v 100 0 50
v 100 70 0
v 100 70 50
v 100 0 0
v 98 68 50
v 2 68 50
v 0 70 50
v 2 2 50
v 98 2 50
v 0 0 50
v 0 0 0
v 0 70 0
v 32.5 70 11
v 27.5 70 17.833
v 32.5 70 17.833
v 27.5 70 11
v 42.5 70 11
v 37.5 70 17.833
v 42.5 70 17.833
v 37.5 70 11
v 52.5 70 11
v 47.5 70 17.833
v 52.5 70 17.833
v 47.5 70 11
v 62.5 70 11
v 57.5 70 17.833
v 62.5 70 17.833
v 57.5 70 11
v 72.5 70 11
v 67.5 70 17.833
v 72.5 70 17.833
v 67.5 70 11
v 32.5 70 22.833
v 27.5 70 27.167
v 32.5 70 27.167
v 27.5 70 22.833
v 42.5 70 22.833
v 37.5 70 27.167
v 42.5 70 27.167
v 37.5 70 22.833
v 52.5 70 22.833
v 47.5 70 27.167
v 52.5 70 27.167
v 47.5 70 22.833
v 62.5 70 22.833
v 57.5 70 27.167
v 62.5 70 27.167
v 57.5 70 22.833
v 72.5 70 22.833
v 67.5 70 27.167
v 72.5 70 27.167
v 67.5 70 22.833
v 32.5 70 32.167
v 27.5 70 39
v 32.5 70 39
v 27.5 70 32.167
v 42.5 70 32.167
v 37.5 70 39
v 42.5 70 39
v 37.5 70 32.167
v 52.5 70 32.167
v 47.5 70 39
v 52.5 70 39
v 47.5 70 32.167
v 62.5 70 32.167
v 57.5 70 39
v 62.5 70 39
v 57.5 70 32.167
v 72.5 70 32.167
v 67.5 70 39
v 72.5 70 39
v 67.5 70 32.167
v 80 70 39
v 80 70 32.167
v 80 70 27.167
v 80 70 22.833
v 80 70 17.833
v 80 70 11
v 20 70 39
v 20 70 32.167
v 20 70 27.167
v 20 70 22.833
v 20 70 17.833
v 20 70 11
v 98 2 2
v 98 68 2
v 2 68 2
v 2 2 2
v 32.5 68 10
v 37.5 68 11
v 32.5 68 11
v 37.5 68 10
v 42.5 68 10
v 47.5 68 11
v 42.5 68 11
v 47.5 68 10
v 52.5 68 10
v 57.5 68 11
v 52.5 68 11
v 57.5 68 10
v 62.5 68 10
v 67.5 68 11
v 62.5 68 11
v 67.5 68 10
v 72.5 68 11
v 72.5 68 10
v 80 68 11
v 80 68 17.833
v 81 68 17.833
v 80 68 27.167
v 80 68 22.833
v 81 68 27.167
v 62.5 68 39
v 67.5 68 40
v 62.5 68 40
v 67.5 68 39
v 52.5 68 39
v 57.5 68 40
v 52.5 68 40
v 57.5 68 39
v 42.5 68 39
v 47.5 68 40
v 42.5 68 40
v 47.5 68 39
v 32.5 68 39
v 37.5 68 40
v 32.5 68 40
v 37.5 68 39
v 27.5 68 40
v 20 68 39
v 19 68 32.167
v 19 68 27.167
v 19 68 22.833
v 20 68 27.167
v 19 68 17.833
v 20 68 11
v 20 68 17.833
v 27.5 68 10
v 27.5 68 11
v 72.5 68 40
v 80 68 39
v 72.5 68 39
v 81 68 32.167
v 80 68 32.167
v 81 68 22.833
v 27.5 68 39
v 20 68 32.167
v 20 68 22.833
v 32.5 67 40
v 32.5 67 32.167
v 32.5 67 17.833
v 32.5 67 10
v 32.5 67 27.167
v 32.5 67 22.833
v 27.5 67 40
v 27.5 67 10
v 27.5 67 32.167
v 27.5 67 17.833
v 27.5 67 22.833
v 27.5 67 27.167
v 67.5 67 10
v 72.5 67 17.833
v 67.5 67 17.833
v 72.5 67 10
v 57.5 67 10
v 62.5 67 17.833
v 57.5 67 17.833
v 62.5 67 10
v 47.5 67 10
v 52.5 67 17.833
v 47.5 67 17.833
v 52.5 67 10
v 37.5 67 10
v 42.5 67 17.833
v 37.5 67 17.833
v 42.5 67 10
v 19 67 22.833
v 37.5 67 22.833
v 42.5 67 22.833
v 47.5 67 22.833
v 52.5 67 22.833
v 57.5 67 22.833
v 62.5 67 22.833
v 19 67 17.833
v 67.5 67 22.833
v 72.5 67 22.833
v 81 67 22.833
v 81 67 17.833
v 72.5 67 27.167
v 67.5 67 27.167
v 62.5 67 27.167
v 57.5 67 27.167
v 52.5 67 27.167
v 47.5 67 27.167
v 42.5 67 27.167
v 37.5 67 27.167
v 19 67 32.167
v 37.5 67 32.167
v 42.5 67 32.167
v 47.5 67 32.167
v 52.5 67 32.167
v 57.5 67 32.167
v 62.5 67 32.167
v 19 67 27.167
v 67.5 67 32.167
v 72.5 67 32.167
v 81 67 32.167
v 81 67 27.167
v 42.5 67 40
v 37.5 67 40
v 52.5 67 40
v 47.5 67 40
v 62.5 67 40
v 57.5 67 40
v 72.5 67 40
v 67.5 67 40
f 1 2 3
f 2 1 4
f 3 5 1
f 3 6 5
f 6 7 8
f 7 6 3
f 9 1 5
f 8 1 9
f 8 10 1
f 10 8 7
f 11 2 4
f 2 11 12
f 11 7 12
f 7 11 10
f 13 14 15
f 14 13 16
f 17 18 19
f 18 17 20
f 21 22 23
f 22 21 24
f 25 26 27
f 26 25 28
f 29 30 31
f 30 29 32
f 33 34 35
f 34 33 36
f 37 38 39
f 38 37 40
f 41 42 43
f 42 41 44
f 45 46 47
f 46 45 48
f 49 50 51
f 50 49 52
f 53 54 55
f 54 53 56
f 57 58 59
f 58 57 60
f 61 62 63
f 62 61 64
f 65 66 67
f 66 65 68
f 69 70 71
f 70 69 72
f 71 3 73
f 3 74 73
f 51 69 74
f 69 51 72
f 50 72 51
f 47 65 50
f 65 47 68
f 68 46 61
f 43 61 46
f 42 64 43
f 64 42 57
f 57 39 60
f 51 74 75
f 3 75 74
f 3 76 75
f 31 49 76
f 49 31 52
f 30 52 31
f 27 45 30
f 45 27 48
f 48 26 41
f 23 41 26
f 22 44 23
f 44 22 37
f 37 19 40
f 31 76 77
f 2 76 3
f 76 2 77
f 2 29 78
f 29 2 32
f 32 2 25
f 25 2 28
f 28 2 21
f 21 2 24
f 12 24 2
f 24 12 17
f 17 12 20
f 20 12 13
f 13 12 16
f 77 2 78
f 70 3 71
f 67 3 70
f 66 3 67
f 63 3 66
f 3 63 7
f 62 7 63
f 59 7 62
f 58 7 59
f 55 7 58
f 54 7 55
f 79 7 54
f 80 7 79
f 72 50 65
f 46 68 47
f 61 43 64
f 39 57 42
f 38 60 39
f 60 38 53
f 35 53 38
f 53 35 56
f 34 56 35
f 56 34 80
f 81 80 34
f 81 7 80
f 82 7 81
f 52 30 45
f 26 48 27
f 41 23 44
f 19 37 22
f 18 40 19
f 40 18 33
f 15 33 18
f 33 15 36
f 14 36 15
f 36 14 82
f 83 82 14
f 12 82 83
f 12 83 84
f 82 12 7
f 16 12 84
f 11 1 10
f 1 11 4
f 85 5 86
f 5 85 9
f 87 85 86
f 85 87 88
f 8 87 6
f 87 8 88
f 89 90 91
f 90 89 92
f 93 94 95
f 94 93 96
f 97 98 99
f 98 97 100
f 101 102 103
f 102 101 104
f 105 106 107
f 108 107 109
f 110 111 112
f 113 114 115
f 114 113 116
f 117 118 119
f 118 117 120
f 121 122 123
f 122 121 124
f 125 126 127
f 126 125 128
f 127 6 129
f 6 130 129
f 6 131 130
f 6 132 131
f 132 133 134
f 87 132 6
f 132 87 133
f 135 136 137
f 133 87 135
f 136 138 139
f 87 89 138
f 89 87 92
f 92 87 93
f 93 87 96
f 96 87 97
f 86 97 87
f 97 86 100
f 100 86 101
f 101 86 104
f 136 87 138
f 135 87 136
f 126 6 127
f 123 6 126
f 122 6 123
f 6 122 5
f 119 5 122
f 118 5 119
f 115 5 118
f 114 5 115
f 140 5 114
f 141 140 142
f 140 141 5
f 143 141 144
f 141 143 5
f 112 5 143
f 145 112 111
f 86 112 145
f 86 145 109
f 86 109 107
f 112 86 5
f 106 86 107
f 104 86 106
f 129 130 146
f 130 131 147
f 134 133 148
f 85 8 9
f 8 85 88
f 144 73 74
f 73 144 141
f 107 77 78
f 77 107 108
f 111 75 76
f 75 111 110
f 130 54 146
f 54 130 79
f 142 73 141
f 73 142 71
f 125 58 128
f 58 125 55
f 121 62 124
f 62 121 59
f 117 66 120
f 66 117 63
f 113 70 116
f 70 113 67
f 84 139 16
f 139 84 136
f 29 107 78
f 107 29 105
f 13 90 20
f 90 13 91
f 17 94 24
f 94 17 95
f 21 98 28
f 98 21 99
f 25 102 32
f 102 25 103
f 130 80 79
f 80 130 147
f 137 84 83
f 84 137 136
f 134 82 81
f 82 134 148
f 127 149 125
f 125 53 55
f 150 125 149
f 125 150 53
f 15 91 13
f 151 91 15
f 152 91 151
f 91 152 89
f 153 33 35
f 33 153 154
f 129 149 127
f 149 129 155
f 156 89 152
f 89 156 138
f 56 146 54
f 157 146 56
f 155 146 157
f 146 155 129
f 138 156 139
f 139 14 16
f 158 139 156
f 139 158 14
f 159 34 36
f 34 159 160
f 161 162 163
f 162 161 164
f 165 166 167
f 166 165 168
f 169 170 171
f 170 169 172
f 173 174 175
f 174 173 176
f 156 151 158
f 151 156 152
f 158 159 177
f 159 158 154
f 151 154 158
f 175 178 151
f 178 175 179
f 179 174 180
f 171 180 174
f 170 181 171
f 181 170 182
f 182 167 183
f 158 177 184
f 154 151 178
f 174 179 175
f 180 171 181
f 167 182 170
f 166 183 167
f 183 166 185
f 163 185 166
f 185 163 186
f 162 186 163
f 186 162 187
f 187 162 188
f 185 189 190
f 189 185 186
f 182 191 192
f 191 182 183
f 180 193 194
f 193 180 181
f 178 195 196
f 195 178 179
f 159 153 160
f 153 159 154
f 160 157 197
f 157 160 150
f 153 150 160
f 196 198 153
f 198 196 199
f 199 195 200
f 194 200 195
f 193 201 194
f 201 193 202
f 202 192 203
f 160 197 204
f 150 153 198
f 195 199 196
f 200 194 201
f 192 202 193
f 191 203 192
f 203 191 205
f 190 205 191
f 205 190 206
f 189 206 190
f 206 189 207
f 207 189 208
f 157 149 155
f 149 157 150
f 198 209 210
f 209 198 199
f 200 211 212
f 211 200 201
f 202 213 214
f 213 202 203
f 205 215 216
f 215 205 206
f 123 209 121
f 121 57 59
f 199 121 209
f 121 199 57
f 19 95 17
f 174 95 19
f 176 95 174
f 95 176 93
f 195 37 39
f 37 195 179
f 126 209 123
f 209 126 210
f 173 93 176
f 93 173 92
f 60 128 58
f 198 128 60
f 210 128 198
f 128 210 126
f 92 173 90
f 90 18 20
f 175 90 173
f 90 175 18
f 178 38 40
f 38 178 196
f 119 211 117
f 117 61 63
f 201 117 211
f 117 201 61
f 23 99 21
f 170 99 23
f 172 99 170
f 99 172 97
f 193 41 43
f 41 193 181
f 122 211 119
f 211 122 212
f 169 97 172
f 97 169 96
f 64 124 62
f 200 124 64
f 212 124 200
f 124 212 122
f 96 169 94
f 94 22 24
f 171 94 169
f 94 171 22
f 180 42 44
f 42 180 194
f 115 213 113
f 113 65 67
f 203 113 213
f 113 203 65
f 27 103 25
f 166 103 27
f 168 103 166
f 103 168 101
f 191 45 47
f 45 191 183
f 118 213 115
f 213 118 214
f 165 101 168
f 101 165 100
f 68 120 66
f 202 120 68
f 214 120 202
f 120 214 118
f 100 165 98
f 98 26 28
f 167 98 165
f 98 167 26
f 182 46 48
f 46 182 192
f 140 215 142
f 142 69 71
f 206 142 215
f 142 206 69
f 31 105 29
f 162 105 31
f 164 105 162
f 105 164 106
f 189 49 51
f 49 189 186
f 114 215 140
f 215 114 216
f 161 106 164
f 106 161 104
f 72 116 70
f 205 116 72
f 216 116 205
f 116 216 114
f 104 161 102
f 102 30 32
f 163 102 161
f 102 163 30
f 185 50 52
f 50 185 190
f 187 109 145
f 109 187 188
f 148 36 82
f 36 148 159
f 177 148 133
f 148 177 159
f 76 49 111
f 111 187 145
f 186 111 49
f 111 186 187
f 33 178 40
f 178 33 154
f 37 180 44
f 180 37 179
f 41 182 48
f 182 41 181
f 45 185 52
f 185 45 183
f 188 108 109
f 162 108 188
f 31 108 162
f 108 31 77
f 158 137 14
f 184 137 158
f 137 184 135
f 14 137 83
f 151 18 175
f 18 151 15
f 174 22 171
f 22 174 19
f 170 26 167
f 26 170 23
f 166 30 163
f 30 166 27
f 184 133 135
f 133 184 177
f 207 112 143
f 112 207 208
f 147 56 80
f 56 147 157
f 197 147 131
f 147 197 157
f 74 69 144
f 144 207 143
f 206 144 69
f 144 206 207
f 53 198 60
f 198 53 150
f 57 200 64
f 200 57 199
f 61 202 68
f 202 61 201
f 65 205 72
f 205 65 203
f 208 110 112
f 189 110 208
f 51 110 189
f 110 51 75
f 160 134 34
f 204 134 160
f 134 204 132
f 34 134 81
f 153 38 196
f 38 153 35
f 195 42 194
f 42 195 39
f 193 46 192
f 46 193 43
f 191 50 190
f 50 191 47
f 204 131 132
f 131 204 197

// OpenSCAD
$fn = 32;

// ----------------------------------------------------------------------
// Vent box: crossgrid enclosure
// ----------------------------------------------------------------------

// --- parameters (mm) ---
box_l = 100;              // box length, X
box_w = 70;               // box width, Y
box_h = 50;               // box height, Z
wall_t = 2;               // shell wall thickness
win_l = 60;               // vent window width, X
win_h = 28;               // vent window height, Z
bar_w = 5;                // grid bar width
n_v = 5;                  // vertical bar count
n_h = 2;                  // horizontal bar count
fit_tol = 0.05;           // tolerance for press fits, mm
free_tol = 0.2;           // tolerance for clearance fits, mm

win_z0 = (box_h - win_h) / 2;  // window lower edge Z
v_step = win_l / (n_v + 1);  // vertical bar step
h_step = win_h / (n_h + 1);  // horizontal bar step

difference() {
  union() {
    difference() {
      cube([box_l, box_w, box_h]);
  translate([wall_t, wall_t, wall_t])
    cube([box_l - 2 * wall_t, box_w - 2 * wall_t, box_h]);
  translate([(box_l - win_l) / 2, box_w - wall_t - 1, win_z0])
    cube([win_l, wall_t + 2, win_h]);
    }
    for (i = [1 : n_v])
      translate([(box_l - win_l) / 2 + i * v_step - bar_w / 2,
                 box_w - wall_t - 1, win_z0 - 1])
        cube([bar_w, wall_t + 1, win_h + 2]);
    for (i = [1 : n_h])
      translate([(box_l - win_l) / 2 - 1, box_w - wall_t - 1,
                 win_z0 + i * h_step - bar_w / 2])
        cube([win_l + 2, wall_t + 1, bar_w]);
  }
}
